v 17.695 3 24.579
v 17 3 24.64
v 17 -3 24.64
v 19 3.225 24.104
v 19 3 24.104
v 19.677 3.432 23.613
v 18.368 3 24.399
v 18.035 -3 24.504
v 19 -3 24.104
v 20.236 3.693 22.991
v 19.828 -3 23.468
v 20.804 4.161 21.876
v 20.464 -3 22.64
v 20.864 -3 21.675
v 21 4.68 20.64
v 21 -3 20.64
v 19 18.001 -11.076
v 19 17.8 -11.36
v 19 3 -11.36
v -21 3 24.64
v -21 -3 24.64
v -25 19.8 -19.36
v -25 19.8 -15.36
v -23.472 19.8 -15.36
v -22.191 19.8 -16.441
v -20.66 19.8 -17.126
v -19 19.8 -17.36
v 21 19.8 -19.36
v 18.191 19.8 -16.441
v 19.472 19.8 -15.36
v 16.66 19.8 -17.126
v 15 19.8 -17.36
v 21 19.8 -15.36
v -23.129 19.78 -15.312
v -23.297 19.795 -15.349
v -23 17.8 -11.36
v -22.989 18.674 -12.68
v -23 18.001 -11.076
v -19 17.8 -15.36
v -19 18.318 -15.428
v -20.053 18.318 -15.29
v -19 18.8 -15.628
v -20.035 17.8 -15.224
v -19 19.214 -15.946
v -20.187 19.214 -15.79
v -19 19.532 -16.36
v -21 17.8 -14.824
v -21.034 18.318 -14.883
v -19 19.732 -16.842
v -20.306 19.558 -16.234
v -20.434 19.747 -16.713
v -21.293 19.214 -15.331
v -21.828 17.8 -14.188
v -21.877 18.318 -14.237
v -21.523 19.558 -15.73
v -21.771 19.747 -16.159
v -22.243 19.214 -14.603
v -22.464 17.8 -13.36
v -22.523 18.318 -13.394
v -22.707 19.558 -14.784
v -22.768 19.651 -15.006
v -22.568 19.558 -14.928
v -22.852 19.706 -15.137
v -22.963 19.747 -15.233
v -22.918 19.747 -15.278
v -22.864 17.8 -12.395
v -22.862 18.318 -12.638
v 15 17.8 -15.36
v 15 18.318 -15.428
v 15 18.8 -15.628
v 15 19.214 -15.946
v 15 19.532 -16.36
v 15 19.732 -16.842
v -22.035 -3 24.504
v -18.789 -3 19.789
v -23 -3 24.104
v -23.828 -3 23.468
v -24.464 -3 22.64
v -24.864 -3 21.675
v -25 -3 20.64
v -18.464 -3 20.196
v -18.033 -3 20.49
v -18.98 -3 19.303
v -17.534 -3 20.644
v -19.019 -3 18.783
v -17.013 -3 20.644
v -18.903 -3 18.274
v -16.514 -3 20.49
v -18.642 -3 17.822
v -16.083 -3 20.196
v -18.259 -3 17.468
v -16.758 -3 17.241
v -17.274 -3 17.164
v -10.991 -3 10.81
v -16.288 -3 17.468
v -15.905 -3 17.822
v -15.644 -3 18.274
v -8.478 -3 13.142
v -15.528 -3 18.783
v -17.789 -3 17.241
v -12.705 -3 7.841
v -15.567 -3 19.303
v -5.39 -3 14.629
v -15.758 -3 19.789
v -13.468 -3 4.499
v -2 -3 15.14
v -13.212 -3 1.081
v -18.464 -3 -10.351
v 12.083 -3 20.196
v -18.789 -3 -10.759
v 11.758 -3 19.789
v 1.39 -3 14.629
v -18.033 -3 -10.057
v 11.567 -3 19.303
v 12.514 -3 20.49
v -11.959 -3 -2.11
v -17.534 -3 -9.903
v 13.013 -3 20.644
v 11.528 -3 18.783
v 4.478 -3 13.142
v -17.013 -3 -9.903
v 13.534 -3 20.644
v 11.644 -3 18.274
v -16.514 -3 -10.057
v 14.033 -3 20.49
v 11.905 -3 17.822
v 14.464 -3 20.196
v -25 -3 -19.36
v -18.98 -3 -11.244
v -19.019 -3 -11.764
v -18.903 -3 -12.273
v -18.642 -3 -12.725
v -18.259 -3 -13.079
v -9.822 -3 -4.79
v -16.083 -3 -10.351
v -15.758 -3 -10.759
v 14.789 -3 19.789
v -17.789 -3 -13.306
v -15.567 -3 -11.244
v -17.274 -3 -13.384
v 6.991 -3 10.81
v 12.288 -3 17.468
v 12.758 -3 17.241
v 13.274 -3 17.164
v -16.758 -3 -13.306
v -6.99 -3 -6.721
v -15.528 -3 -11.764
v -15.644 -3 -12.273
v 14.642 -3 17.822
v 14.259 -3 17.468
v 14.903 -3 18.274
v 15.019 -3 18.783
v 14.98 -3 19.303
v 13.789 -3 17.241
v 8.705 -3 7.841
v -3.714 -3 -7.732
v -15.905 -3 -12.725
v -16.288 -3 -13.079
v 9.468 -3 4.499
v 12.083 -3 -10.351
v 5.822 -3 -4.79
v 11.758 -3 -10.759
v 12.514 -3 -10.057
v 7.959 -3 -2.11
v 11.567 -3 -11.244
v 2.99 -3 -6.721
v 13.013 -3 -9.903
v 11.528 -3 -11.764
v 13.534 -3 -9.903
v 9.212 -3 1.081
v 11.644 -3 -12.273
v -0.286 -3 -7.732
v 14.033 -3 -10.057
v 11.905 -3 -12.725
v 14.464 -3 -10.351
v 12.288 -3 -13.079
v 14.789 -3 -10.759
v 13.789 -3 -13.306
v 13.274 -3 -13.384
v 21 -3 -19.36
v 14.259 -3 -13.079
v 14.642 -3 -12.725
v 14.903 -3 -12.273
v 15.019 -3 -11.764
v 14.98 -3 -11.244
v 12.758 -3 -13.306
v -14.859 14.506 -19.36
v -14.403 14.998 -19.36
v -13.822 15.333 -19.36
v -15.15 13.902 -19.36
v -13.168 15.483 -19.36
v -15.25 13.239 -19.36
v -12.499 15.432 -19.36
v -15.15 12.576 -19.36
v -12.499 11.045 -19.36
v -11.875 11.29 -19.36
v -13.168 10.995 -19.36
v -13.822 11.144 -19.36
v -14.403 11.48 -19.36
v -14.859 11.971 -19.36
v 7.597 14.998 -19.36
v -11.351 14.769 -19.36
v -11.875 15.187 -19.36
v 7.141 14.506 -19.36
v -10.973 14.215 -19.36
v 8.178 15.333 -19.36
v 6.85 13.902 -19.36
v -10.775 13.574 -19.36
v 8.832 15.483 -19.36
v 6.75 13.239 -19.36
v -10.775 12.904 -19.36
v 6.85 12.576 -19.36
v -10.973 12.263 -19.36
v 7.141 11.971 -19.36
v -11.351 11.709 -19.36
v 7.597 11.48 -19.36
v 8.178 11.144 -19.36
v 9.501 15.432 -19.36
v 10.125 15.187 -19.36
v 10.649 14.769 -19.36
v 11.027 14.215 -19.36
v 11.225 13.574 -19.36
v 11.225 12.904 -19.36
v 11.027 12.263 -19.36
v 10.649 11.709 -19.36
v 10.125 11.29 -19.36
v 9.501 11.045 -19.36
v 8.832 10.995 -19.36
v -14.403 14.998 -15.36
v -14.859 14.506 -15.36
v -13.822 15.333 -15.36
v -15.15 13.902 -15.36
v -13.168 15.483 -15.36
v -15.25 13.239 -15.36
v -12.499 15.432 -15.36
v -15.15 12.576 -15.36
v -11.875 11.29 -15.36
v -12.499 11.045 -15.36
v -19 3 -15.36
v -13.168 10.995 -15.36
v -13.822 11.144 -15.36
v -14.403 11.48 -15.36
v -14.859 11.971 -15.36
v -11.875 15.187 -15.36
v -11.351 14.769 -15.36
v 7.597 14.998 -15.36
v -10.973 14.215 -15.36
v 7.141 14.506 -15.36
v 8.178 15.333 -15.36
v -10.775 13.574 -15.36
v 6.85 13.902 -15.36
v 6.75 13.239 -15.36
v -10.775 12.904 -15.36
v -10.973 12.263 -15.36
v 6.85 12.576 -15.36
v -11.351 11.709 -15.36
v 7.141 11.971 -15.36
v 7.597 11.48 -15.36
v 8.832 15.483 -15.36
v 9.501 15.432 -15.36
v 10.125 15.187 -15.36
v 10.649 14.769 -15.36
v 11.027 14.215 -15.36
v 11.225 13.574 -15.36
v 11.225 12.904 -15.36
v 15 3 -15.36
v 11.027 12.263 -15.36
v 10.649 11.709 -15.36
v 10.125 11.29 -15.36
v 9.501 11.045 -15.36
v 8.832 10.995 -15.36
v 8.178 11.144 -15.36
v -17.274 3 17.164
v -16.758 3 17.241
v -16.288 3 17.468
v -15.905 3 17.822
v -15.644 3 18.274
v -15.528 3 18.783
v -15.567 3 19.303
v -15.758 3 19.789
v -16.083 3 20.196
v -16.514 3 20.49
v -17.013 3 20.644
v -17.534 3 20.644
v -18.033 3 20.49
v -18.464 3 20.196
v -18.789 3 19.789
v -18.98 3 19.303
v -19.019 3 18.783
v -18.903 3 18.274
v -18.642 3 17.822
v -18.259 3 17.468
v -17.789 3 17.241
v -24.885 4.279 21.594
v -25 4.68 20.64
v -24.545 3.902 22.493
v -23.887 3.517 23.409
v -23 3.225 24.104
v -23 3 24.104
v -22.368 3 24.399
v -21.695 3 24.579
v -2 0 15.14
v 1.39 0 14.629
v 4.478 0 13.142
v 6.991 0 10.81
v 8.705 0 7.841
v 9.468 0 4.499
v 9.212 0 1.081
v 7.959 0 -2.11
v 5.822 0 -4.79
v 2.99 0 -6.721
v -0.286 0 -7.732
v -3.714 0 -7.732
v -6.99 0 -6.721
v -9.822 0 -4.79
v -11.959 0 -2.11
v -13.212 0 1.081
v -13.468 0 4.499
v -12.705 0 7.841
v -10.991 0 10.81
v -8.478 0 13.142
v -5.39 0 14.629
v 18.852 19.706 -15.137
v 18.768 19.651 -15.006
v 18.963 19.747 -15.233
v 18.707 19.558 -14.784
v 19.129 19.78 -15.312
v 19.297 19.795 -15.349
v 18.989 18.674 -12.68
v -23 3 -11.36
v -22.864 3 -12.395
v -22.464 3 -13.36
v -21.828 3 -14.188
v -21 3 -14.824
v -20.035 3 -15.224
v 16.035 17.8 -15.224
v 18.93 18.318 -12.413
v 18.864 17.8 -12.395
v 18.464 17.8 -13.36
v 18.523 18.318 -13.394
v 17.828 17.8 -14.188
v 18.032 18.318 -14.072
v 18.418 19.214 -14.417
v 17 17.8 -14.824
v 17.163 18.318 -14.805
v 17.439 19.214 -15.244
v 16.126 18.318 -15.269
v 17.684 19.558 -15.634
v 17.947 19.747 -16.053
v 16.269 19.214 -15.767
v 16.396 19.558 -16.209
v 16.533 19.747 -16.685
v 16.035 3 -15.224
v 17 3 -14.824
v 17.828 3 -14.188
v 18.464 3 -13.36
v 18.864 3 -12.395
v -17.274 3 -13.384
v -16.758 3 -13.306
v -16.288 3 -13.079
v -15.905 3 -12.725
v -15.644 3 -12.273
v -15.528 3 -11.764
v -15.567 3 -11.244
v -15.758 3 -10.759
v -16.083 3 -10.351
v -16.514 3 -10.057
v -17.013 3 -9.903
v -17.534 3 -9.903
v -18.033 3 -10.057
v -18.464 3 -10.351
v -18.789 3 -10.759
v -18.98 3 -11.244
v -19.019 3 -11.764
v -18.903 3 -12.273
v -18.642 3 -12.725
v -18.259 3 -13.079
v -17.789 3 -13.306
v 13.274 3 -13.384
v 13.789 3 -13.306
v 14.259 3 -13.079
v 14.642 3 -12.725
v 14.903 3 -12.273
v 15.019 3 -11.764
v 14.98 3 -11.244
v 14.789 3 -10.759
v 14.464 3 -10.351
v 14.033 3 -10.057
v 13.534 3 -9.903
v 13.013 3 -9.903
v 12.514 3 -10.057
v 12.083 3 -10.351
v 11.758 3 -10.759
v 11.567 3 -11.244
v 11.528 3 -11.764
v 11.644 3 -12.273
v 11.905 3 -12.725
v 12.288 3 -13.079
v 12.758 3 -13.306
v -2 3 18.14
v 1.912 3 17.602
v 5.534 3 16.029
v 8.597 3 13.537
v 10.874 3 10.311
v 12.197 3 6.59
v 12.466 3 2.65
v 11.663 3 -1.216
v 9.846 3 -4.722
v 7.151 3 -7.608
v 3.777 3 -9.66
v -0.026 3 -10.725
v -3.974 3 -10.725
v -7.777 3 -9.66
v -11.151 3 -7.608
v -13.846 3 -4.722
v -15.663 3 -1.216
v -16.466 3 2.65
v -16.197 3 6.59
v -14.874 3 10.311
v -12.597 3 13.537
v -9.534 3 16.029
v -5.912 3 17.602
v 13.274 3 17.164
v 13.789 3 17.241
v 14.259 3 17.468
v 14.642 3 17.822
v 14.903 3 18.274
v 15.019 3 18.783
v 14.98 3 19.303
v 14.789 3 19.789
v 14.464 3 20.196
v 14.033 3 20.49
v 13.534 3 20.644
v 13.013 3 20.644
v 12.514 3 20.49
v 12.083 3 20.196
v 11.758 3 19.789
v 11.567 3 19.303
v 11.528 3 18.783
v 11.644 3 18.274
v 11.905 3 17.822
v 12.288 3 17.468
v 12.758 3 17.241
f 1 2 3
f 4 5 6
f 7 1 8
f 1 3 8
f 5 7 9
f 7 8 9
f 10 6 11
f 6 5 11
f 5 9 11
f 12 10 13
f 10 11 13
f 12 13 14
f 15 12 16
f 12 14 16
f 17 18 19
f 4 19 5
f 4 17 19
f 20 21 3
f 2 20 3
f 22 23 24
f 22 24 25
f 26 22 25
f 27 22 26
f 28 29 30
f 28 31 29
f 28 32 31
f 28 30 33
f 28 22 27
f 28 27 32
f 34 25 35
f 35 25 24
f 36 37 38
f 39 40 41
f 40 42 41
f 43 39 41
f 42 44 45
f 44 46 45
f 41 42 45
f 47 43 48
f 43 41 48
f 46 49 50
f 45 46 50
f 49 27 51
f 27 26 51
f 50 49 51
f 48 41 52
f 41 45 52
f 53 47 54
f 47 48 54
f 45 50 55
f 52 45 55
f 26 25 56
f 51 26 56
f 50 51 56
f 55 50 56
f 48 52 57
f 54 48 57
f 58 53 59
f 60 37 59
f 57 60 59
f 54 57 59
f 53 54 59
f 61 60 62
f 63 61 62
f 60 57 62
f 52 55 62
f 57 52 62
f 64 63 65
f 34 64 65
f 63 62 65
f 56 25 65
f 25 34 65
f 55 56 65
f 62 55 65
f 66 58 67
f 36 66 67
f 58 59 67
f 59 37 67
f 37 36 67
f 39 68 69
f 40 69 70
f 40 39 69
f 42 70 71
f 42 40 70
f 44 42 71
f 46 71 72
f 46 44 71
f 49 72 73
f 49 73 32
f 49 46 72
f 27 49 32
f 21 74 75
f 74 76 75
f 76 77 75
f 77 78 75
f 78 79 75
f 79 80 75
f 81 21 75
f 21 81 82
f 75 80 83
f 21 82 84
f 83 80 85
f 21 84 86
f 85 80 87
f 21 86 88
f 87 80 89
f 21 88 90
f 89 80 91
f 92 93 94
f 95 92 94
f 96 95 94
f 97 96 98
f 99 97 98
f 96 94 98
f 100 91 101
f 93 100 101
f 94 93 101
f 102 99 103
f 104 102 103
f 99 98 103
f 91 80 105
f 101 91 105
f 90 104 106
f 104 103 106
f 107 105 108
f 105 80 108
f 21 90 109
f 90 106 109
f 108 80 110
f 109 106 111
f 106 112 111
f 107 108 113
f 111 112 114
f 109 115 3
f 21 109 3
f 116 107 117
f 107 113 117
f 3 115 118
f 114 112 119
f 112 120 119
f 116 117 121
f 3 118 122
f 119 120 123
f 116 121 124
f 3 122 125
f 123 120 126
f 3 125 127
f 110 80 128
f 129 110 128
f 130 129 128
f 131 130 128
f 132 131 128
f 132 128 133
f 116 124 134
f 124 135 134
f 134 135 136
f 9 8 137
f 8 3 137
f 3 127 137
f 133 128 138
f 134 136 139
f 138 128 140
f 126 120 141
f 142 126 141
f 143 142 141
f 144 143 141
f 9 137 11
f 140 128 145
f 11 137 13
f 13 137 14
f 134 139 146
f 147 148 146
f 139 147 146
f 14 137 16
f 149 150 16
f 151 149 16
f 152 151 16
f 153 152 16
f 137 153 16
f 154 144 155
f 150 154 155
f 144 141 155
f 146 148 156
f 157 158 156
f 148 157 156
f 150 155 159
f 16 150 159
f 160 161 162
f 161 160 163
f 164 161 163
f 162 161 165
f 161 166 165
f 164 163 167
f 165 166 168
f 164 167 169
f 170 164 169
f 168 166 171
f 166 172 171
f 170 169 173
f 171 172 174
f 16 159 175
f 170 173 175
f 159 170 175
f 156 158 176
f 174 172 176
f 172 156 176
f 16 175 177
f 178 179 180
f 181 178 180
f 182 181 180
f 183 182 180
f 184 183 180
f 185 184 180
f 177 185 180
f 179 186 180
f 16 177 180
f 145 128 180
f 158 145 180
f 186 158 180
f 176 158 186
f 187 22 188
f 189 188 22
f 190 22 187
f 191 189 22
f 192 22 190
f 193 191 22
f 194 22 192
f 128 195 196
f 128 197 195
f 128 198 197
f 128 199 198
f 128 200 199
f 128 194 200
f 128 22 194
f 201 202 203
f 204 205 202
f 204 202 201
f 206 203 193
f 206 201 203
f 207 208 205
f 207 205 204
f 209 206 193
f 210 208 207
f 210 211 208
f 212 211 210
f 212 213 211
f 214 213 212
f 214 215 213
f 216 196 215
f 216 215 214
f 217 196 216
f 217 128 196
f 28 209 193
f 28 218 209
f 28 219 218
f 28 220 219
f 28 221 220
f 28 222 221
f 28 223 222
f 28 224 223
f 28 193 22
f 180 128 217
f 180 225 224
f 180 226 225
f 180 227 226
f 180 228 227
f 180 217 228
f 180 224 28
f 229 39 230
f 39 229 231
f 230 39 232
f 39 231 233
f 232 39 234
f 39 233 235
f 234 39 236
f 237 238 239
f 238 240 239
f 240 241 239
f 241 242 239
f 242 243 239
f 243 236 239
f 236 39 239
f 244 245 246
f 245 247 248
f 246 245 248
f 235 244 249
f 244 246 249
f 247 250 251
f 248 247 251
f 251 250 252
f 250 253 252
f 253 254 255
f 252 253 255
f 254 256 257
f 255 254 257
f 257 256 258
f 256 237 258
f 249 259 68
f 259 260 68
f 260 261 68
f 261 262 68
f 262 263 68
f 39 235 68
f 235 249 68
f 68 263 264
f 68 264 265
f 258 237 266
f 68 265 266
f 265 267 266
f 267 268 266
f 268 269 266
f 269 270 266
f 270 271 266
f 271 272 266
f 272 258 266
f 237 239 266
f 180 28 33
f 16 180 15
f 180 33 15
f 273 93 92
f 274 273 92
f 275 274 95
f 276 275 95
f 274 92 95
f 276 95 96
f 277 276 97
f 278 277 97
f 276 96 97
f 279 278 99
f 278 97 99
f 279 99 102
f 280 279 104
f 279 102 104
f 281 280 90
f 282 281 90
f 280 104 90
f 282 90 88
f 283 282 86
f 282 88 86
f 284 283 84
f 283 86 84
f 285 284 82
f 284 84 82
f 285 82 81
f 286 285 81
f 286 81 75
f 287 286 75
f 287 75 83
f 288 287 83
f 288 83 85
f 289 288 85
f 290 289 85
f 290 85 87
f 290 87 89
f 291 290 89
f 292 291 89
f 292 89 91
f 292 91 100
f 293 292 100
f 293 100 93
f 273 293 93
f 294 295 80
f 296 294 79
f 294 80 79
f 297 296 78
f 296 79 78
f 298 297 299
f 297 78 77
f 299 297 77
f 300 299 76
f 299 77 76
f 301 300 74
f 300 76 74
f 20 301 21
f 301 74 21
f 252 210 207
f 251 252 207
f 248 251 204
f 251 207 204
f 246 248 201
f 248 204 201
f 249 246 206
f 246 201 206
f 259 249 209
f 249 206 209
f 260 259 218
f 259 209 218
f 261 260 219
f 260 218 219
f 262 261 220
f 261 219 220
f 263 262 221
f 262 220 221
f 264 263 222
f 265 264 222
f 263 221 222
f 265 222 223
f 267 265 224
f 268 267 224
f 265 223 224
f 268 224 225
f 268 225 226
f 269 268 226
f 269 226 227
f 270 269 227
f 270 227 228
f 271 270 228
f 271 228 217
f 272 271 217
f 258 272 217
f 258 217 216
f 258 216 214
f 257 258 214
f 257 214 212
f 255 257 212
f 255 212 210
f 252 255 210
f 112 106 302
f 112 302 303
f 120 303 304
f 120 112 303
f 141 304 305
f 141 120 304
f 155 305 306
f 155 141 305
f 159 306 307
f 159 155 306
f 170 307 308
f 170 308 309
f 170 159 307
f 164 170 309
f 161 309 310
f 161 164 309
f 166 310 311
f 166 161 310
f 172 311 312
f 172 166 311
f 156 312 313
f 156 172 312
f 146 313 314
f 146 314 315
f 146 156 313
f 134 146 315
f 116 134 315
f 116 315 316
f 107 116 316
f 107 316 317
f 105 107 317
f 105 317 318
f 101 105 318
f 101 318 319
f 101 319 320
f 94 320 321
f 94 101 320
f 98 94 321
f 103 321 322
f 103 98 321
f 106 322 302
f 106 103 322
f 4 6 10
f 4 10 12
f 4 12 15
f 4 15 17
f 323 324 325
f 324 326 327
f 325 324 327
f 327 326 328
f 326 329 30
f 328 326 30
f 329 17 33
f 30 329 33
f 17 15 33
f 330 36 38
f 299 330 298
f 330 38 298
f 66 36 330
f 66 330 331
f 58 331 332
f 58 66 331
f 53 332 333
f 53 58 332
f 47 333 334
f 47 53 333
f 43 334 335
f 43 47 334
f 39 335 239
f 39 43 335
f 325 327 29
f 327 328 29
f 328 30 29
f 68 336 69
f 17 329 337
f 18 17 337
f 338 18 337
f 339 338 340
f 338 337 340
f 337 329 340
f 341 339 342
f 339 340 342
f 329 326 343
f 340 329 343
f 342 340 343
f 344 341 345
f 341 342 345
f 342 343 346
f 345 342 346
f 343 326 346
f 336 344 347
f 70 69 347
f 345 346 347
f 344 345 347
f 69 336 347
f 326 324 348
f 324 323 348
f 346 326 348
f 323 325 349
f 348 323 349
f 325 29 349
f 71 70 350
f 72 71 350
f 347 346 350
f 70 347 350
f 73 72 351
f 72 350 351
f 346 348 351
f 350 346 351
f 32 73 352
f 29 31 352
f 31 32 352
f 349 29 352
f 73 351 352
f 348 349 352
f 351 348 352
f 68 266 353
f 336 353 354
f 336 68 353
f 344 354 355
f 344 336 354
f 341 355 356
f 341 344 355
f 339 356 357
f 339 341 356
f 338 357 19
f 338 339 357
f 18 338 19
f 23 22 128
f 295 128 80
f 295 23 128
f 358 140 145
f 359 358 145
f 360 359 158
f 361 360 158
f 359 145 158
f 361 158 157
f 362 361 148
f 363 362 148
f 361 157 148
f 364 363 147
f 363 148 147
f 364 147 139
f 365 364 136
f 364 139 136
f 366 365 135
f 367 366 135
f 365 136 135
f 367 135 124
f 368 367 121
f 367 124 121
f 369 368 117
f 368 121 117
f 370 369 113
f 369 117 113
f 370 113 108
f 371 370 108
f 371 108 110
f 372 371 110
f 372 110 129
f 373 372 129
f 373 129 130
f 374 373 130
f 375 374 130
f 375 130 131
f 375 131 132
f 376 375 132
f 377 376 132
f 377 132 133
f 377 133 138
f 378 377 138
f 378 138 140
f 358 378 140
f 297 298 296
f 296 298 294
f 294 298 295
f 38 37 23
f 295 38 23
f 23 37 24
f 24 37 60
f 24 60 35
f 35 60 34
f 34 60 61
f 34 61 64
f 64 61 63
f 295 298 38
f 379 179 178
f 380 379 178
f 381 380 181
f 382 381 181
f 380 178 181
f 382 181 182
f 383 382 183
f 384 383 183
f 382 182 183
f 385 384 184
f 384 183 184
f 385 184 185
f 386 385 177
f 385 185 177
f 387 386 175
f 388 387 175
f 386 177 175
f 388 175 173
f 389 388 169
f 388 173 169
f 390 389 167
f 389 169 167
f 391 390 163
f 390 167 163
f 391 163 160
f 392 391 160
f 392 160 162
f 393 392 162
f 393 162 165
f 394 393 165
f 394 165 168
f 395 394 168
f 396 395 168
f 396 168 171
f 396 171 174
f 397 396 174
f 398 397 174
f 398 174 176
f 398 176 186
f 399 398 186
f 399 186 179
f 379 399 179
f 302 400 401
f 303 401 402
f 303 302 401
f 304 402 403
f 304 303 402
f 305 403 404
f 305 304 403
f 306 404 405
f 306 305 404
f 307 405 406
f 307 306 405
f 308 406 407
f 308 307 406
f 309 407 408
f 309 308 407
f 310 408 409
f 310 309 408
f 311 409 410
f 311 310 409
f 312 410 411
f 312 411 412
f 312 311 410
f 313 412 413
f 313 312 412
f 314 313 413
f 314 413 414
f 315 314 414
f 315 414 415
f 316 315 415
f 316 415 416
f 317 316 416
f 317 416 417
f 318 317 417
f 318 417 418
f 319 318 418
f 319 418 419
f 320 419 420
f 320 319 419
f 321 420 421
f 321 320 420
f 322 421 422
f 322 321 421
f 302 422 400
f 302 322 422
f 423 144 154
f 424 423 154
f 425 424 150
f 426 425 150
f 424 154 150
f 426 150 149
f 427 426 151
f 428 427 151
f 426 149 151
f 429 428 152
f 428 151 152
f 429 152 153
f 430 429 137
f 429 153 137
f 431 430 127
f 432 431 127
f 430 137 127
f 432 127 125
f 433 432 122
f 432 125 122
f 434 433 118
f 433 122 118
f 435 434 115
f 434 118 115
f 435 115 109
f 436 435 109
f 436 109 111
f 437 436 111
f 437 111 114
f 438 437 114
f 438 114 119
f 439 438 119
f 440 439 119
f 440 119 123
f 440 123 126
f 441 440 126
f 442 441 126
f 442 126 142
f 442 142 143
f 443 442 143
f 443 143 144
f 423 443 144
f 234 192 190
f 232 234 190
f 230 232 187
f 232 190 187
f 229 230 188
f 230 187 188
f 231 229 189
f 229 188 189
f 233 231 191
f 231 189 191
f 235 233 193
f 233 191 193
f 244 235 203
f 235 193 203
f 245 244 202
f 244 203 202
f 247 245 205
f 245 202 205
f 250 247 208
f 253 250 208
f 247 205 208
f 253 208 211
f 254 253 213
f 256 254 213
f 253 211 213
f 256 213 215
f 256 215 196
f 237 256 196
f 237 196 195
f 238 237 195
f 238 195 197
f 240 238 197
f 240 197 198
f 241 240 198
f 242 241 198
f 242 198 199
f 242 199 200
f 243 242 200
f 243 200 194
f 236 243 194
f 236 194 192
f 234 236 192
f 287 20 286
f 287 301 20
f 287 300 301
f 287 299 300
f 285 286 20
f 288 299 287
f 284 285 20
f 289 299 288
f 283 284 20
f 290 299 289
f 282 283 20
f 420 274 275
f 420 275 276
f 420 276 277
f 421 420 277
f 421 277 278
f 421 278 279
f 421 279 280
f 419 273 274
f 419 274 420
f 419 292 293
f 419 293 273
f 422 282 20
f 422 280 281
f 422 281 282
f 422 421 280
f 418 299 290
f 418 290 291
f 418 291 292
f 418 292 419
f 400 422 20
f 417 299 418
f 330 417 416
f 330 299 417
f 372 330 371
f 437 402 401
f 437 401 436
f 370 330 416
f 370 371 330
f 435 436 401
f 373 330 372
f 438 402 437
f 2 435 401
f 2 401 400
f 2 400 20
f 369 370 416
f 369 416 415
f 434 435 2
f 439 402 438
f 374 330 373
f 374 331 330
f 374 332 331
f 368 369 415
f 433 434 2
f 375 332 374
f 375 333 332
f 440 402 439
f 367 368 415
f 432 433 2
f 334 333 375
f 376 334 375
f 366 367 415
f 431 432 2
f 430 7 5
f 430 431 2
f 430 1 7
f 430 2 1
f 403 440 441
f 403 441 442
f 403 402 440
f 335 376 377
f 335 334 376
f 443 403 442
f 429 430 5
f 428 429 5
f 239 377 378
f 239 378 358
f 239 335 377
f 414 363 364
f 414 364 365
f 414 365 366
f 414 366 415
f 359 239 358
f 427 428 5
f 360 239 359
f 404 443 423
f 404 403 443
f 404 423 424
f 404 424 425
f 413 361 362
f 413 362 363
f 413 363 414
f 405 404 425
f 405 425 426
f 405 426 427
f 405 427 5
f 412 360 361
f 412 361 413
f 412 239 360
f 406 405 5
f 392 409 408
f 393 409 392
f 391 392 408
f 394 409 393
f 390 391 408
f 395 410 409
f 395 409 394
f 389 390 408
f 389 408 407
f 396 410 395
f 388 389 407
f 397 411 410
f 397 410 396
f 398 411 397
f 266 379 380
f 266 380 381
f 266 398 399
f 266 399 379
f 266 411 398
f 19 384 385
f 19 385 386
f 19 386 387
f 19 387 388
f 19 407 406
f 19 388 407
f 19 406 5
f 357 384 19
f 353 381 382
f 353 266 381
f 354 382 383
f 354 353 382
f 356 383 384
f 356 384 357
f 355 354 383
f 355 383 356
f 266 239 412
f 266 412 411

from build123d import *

# Parameters (mm, degrees)
BOSS_EXTRUDE1_START = -3
SKETCH1_W           = 46
SKETCH1_H           = 44
SKETCH1_R           = 11.5
BOSS_EXTRUDE1_DEPTH = 6
SKETCH3_W           = 46
SKETCH3_H           = 4
BOSS_EXTRUDE2_DEPTH = 16.8
BOSS_EXTRUDE3_DEPTH = 2
BOSS_EXTRUDE4_START = -46
BOSS_EXTRUDE4_DEPTH = 2
SKETCH5_R           = 1.75
CUT_EXTRUDE1_DEPTH  = 42.856535929
SKETCH6_R           = 2.25
CUT_EXTRUDE2_DEPTH  = 55.341880718
FILLET1_R           = 4
FILLET2_START       = -19.0000001
FILLET2_2_DEPTH     = 34.0000001
CHAMFER1_SIZE       = 3


with BuildPart() as part:
    # Sketch1 → Boss-Extrude1 (new body)
    with BuildSketch(Plane(origin=(0, 0, 0), x_dir=(1, 0, 0), z_dir=(0, 1, 0)).offset(BOSS_EXTRUDE1_START)):
        with Locations((-2, -2.64)):
            Rectangle(SKETCH1_W, SKETCH1_H)
        with Locations(Location((-2, -3.64, 0), (0, 0, 270))):
            Circle(SKETCH1_R, mode=Mode.SUBTRACT)
    extrude(amount=BOSS_EXTRUDE1_DEPTH)

    # Sketch3 → Boss-Extrude2 (add)
    with BuildSketch(Plane(origin=(0, 3, 0), x_dir=(1, 0, 0), z_dir=(0, 1, 0))):
        with Locations((-2, 17.36)):
            Rectangle(SKETCH3_W, SKETCH3_H)
    extrude(amount=BOSS_EXTRUDE2_DEPTH)

    # Sketch4 → Boss-Extrude3 (add)
    with BuildSketch(Plane.ZY.offset(25)):
        Polygon((-15.36, 19.8), (-15.36, 3), (24.64, 3), align=None)
    extrude(amount=-BOSS_EXTRUDE3_DEPTH)

    # Sketch4<2> → Boss-Extrude4 (add)
    with BuildSketch(Plane.ZY.offset(25).offset(BOSS_EXTRUDE4_START)):
        Polygon((-15.36, 19.8), (-15.36, 3), (24.64, 3), align=None)
    extrude(amount=BOSS_EXTRUDE4_DEPTH)

    # Sketch5 → Cut-Extrude1 (cut, through all)
    with BuildSketch(Plane.XZ.offset(3)):
        with Locations(Location((-17.273506474, 18.913506474, 0), (0, 0, 270))):
            Circle(SKETCH5_R)
        with Locations(Location((13.273506474, 18.913506474, 0), (0, 0, 270))):
            Circle(SKETCH5_R)
        with Locations(Location((13.273506474, -11.633506474, 0), (0, 0, 270))):
            Circle(SKETCH5_R)
        with Locations(Location((-17.273506474, -11.633506474, 0), (0, 0, 270))):
            Circle(SKETCH5_R)
    extrude(amount=-CUT_EXTRUDE1_DEPTH, mode=Mode.SUBTRACT)

    # Sketch6 → Cut-Extrude2 (cut, through all)
    with BuildSketch(Plane(origin=(0, 0, -19.36), x_dir=(-1, 0, 0), z_dir=(0, 0, -1))):
        with Locations((-9, 13.23890477)):
            Circle(SKETCH6_R)
        with Locations((13, 13.23890477)):
            Circle(SKETCH6_R)
    extrude(amount=-CUT_EXTRUDE2_DEPTH, mode=Mode.SUBTRACT)

    # Fillet1
    # the kernel refuses this fillet: 4 mm, written as the material it adds along each edge
    with BuildSketch(Plane(origin=(-23, 29.8, -15.36), x_dir=(0, 0, 1), z_dir=(0, -1, 0))) as fillet1_piece_1_section:
        with BuildLine():
            CenterArc((FILLET1_R, -FILLET1_R), FILLET1_R, 90, 90)
            Line((0, -FILLET1_R), (0, 0))
            Line((0, 0), (FILLET1_R, 0))
        make_face()
    fillet1_piece_1 = extrude(amount=26.8, mode=Mode.PRIVATE)
    fillet1_piece_1 = split(fillet1_piece_1, bisect_by=Plane(origin=(-23, 21.299489969, -18.930214213), z_dir=(0, -0.9219821056073614, -0.3872324843550918)), keep=Keep.TOP, mode=Mode.PRIVATE)
    add(fillet1_piece_1)
    with BuildSketch(Plane(origin=(19, 29.8, -15.36), x_dir=(0, 0, 1), z_dir=(0, -1, 0))) as fillet1_piece_2_section:
        with BuildLine():
            CenterArc((FILLET1_R, FILLET1_R), FILLET1_R, 180, 90)
            Line((0, FILLET1_R), (0, 0))
            Line((0, 0), (FILLET1_R, 0))
        make_face()
    fillet1_piece_2 = extrude(amount=26.8, mode=Mode.PRIVATE)
    fillet1_piece_2 = split(fillet1_piece_2, bisect_by=Plane(origin=(19, 21.299489969, -18.930214213), z_dir=(0, -0.9219821056073614, -0.3872324843550918)), keep=Keep.TOP, mode=Mode.PRIVATE)
    add(fillet1_piece_2)
    # the kernel refuses this fillet: 4 mm, written as the material it takes off along each edge
    with BuildSketch(Plane(origin=(21, -13, 24.64), x_dir=(-1, 0, 0), z_dir=(0, 1, 0))) as fillet1_2_piece_1:
        with BuildLine():
            CenterArc((FILLET1_R, -FILLET1_R), FILLET1_R, 90, 90)
            Line((0, -FILLET1_R), (0, 0))
            Line((0, 0), (FILLET1_R, 0))
        make_face()
    extrude(amount=26, mode=Mode.SUBTRACT)
    with BuildSketch(Plane(origin=(-25, -13, 24.64), x_dir=(1, 0, 0), z_dir=(0, 1, 0))) as fillet1_2_piece_2:
        with BuildLine():
            CenterArc((FILLET1_R, FILLET1_R), FILLET1_R, 180, 90)
            Line((0, FILLET1_R), (0, 0))
            Line((0, 0), (FILLET1_R, 0))
        make_face()
    extrude(amount=26, mode=Mode.SUBTRACT)

    # Fillet2: read off the stored shape, not the designer's step
    # Fillet2 outline → Fillet2 (revolve, cut)
    with BuildSketch(Plane(origin=(15, 0, -11.36), x_dir=(1, 0, 0), z_dir=(0, 0, 1))):
        with BuildLine():
            ThreePointArc((4, 17.8), (4.585786438, 19.214213562), (6, 19.8))
            Line((6, 19.8), (4, 19.8))
            Line((4, 19.8), (4, 17.8))
        make_face()
    revolve(axis=Axis((15, 0, -11.36), (0, 1, 0)), mode=Mode.SUBTRACT)

    # Fillet2 2 outline → Fillet2 2 (cut)
    with BuildSketch(Plane.YZ.offset(FILLET2_START)):
        with BuildLine():
            Line((19.8, -15.36), (17.8, -15.36))
            ThreePointArc((17.8, -15.36), (19.214213562, -15.945786438), (19.8, -17.36))
            Line((19.8, -17.36), (19.8, -15.36))
        make_face()
    extrude(amount=FILLET2_2_DEPTH, mode=Mode.SUBTRACT)

    # Fillet2 3 outline → Fillet2 3 (revolve, cut)
    with BuildSketch(Plane(origin=(-19, 0, -11.36), x_dir=(1, 0, 0), z_dir=(0, 0, 1))):
        with BuildLine():
            ThreePointArc((4, 17.8), (4.585786438, 19.214213562), (6, 19.8))
            Line((6, 19.8), (4, 19.8))
            Line((4, 19.8), (4, 17.8))
        make_face()
    revolve(axis=Axis((-19, 0, -11.36), (0, 1, 0)), mode=Mode.SUBTRACT)

    # Chamfer1
    chamfer1_edges = [part.edges().sort_by_distance(p)[0] for p in [
        (-2, 3, -7.86),
    ]]
    chamfer(chamfer1_edges, length=CHAMFER1_SIZE)


solid = part.part
